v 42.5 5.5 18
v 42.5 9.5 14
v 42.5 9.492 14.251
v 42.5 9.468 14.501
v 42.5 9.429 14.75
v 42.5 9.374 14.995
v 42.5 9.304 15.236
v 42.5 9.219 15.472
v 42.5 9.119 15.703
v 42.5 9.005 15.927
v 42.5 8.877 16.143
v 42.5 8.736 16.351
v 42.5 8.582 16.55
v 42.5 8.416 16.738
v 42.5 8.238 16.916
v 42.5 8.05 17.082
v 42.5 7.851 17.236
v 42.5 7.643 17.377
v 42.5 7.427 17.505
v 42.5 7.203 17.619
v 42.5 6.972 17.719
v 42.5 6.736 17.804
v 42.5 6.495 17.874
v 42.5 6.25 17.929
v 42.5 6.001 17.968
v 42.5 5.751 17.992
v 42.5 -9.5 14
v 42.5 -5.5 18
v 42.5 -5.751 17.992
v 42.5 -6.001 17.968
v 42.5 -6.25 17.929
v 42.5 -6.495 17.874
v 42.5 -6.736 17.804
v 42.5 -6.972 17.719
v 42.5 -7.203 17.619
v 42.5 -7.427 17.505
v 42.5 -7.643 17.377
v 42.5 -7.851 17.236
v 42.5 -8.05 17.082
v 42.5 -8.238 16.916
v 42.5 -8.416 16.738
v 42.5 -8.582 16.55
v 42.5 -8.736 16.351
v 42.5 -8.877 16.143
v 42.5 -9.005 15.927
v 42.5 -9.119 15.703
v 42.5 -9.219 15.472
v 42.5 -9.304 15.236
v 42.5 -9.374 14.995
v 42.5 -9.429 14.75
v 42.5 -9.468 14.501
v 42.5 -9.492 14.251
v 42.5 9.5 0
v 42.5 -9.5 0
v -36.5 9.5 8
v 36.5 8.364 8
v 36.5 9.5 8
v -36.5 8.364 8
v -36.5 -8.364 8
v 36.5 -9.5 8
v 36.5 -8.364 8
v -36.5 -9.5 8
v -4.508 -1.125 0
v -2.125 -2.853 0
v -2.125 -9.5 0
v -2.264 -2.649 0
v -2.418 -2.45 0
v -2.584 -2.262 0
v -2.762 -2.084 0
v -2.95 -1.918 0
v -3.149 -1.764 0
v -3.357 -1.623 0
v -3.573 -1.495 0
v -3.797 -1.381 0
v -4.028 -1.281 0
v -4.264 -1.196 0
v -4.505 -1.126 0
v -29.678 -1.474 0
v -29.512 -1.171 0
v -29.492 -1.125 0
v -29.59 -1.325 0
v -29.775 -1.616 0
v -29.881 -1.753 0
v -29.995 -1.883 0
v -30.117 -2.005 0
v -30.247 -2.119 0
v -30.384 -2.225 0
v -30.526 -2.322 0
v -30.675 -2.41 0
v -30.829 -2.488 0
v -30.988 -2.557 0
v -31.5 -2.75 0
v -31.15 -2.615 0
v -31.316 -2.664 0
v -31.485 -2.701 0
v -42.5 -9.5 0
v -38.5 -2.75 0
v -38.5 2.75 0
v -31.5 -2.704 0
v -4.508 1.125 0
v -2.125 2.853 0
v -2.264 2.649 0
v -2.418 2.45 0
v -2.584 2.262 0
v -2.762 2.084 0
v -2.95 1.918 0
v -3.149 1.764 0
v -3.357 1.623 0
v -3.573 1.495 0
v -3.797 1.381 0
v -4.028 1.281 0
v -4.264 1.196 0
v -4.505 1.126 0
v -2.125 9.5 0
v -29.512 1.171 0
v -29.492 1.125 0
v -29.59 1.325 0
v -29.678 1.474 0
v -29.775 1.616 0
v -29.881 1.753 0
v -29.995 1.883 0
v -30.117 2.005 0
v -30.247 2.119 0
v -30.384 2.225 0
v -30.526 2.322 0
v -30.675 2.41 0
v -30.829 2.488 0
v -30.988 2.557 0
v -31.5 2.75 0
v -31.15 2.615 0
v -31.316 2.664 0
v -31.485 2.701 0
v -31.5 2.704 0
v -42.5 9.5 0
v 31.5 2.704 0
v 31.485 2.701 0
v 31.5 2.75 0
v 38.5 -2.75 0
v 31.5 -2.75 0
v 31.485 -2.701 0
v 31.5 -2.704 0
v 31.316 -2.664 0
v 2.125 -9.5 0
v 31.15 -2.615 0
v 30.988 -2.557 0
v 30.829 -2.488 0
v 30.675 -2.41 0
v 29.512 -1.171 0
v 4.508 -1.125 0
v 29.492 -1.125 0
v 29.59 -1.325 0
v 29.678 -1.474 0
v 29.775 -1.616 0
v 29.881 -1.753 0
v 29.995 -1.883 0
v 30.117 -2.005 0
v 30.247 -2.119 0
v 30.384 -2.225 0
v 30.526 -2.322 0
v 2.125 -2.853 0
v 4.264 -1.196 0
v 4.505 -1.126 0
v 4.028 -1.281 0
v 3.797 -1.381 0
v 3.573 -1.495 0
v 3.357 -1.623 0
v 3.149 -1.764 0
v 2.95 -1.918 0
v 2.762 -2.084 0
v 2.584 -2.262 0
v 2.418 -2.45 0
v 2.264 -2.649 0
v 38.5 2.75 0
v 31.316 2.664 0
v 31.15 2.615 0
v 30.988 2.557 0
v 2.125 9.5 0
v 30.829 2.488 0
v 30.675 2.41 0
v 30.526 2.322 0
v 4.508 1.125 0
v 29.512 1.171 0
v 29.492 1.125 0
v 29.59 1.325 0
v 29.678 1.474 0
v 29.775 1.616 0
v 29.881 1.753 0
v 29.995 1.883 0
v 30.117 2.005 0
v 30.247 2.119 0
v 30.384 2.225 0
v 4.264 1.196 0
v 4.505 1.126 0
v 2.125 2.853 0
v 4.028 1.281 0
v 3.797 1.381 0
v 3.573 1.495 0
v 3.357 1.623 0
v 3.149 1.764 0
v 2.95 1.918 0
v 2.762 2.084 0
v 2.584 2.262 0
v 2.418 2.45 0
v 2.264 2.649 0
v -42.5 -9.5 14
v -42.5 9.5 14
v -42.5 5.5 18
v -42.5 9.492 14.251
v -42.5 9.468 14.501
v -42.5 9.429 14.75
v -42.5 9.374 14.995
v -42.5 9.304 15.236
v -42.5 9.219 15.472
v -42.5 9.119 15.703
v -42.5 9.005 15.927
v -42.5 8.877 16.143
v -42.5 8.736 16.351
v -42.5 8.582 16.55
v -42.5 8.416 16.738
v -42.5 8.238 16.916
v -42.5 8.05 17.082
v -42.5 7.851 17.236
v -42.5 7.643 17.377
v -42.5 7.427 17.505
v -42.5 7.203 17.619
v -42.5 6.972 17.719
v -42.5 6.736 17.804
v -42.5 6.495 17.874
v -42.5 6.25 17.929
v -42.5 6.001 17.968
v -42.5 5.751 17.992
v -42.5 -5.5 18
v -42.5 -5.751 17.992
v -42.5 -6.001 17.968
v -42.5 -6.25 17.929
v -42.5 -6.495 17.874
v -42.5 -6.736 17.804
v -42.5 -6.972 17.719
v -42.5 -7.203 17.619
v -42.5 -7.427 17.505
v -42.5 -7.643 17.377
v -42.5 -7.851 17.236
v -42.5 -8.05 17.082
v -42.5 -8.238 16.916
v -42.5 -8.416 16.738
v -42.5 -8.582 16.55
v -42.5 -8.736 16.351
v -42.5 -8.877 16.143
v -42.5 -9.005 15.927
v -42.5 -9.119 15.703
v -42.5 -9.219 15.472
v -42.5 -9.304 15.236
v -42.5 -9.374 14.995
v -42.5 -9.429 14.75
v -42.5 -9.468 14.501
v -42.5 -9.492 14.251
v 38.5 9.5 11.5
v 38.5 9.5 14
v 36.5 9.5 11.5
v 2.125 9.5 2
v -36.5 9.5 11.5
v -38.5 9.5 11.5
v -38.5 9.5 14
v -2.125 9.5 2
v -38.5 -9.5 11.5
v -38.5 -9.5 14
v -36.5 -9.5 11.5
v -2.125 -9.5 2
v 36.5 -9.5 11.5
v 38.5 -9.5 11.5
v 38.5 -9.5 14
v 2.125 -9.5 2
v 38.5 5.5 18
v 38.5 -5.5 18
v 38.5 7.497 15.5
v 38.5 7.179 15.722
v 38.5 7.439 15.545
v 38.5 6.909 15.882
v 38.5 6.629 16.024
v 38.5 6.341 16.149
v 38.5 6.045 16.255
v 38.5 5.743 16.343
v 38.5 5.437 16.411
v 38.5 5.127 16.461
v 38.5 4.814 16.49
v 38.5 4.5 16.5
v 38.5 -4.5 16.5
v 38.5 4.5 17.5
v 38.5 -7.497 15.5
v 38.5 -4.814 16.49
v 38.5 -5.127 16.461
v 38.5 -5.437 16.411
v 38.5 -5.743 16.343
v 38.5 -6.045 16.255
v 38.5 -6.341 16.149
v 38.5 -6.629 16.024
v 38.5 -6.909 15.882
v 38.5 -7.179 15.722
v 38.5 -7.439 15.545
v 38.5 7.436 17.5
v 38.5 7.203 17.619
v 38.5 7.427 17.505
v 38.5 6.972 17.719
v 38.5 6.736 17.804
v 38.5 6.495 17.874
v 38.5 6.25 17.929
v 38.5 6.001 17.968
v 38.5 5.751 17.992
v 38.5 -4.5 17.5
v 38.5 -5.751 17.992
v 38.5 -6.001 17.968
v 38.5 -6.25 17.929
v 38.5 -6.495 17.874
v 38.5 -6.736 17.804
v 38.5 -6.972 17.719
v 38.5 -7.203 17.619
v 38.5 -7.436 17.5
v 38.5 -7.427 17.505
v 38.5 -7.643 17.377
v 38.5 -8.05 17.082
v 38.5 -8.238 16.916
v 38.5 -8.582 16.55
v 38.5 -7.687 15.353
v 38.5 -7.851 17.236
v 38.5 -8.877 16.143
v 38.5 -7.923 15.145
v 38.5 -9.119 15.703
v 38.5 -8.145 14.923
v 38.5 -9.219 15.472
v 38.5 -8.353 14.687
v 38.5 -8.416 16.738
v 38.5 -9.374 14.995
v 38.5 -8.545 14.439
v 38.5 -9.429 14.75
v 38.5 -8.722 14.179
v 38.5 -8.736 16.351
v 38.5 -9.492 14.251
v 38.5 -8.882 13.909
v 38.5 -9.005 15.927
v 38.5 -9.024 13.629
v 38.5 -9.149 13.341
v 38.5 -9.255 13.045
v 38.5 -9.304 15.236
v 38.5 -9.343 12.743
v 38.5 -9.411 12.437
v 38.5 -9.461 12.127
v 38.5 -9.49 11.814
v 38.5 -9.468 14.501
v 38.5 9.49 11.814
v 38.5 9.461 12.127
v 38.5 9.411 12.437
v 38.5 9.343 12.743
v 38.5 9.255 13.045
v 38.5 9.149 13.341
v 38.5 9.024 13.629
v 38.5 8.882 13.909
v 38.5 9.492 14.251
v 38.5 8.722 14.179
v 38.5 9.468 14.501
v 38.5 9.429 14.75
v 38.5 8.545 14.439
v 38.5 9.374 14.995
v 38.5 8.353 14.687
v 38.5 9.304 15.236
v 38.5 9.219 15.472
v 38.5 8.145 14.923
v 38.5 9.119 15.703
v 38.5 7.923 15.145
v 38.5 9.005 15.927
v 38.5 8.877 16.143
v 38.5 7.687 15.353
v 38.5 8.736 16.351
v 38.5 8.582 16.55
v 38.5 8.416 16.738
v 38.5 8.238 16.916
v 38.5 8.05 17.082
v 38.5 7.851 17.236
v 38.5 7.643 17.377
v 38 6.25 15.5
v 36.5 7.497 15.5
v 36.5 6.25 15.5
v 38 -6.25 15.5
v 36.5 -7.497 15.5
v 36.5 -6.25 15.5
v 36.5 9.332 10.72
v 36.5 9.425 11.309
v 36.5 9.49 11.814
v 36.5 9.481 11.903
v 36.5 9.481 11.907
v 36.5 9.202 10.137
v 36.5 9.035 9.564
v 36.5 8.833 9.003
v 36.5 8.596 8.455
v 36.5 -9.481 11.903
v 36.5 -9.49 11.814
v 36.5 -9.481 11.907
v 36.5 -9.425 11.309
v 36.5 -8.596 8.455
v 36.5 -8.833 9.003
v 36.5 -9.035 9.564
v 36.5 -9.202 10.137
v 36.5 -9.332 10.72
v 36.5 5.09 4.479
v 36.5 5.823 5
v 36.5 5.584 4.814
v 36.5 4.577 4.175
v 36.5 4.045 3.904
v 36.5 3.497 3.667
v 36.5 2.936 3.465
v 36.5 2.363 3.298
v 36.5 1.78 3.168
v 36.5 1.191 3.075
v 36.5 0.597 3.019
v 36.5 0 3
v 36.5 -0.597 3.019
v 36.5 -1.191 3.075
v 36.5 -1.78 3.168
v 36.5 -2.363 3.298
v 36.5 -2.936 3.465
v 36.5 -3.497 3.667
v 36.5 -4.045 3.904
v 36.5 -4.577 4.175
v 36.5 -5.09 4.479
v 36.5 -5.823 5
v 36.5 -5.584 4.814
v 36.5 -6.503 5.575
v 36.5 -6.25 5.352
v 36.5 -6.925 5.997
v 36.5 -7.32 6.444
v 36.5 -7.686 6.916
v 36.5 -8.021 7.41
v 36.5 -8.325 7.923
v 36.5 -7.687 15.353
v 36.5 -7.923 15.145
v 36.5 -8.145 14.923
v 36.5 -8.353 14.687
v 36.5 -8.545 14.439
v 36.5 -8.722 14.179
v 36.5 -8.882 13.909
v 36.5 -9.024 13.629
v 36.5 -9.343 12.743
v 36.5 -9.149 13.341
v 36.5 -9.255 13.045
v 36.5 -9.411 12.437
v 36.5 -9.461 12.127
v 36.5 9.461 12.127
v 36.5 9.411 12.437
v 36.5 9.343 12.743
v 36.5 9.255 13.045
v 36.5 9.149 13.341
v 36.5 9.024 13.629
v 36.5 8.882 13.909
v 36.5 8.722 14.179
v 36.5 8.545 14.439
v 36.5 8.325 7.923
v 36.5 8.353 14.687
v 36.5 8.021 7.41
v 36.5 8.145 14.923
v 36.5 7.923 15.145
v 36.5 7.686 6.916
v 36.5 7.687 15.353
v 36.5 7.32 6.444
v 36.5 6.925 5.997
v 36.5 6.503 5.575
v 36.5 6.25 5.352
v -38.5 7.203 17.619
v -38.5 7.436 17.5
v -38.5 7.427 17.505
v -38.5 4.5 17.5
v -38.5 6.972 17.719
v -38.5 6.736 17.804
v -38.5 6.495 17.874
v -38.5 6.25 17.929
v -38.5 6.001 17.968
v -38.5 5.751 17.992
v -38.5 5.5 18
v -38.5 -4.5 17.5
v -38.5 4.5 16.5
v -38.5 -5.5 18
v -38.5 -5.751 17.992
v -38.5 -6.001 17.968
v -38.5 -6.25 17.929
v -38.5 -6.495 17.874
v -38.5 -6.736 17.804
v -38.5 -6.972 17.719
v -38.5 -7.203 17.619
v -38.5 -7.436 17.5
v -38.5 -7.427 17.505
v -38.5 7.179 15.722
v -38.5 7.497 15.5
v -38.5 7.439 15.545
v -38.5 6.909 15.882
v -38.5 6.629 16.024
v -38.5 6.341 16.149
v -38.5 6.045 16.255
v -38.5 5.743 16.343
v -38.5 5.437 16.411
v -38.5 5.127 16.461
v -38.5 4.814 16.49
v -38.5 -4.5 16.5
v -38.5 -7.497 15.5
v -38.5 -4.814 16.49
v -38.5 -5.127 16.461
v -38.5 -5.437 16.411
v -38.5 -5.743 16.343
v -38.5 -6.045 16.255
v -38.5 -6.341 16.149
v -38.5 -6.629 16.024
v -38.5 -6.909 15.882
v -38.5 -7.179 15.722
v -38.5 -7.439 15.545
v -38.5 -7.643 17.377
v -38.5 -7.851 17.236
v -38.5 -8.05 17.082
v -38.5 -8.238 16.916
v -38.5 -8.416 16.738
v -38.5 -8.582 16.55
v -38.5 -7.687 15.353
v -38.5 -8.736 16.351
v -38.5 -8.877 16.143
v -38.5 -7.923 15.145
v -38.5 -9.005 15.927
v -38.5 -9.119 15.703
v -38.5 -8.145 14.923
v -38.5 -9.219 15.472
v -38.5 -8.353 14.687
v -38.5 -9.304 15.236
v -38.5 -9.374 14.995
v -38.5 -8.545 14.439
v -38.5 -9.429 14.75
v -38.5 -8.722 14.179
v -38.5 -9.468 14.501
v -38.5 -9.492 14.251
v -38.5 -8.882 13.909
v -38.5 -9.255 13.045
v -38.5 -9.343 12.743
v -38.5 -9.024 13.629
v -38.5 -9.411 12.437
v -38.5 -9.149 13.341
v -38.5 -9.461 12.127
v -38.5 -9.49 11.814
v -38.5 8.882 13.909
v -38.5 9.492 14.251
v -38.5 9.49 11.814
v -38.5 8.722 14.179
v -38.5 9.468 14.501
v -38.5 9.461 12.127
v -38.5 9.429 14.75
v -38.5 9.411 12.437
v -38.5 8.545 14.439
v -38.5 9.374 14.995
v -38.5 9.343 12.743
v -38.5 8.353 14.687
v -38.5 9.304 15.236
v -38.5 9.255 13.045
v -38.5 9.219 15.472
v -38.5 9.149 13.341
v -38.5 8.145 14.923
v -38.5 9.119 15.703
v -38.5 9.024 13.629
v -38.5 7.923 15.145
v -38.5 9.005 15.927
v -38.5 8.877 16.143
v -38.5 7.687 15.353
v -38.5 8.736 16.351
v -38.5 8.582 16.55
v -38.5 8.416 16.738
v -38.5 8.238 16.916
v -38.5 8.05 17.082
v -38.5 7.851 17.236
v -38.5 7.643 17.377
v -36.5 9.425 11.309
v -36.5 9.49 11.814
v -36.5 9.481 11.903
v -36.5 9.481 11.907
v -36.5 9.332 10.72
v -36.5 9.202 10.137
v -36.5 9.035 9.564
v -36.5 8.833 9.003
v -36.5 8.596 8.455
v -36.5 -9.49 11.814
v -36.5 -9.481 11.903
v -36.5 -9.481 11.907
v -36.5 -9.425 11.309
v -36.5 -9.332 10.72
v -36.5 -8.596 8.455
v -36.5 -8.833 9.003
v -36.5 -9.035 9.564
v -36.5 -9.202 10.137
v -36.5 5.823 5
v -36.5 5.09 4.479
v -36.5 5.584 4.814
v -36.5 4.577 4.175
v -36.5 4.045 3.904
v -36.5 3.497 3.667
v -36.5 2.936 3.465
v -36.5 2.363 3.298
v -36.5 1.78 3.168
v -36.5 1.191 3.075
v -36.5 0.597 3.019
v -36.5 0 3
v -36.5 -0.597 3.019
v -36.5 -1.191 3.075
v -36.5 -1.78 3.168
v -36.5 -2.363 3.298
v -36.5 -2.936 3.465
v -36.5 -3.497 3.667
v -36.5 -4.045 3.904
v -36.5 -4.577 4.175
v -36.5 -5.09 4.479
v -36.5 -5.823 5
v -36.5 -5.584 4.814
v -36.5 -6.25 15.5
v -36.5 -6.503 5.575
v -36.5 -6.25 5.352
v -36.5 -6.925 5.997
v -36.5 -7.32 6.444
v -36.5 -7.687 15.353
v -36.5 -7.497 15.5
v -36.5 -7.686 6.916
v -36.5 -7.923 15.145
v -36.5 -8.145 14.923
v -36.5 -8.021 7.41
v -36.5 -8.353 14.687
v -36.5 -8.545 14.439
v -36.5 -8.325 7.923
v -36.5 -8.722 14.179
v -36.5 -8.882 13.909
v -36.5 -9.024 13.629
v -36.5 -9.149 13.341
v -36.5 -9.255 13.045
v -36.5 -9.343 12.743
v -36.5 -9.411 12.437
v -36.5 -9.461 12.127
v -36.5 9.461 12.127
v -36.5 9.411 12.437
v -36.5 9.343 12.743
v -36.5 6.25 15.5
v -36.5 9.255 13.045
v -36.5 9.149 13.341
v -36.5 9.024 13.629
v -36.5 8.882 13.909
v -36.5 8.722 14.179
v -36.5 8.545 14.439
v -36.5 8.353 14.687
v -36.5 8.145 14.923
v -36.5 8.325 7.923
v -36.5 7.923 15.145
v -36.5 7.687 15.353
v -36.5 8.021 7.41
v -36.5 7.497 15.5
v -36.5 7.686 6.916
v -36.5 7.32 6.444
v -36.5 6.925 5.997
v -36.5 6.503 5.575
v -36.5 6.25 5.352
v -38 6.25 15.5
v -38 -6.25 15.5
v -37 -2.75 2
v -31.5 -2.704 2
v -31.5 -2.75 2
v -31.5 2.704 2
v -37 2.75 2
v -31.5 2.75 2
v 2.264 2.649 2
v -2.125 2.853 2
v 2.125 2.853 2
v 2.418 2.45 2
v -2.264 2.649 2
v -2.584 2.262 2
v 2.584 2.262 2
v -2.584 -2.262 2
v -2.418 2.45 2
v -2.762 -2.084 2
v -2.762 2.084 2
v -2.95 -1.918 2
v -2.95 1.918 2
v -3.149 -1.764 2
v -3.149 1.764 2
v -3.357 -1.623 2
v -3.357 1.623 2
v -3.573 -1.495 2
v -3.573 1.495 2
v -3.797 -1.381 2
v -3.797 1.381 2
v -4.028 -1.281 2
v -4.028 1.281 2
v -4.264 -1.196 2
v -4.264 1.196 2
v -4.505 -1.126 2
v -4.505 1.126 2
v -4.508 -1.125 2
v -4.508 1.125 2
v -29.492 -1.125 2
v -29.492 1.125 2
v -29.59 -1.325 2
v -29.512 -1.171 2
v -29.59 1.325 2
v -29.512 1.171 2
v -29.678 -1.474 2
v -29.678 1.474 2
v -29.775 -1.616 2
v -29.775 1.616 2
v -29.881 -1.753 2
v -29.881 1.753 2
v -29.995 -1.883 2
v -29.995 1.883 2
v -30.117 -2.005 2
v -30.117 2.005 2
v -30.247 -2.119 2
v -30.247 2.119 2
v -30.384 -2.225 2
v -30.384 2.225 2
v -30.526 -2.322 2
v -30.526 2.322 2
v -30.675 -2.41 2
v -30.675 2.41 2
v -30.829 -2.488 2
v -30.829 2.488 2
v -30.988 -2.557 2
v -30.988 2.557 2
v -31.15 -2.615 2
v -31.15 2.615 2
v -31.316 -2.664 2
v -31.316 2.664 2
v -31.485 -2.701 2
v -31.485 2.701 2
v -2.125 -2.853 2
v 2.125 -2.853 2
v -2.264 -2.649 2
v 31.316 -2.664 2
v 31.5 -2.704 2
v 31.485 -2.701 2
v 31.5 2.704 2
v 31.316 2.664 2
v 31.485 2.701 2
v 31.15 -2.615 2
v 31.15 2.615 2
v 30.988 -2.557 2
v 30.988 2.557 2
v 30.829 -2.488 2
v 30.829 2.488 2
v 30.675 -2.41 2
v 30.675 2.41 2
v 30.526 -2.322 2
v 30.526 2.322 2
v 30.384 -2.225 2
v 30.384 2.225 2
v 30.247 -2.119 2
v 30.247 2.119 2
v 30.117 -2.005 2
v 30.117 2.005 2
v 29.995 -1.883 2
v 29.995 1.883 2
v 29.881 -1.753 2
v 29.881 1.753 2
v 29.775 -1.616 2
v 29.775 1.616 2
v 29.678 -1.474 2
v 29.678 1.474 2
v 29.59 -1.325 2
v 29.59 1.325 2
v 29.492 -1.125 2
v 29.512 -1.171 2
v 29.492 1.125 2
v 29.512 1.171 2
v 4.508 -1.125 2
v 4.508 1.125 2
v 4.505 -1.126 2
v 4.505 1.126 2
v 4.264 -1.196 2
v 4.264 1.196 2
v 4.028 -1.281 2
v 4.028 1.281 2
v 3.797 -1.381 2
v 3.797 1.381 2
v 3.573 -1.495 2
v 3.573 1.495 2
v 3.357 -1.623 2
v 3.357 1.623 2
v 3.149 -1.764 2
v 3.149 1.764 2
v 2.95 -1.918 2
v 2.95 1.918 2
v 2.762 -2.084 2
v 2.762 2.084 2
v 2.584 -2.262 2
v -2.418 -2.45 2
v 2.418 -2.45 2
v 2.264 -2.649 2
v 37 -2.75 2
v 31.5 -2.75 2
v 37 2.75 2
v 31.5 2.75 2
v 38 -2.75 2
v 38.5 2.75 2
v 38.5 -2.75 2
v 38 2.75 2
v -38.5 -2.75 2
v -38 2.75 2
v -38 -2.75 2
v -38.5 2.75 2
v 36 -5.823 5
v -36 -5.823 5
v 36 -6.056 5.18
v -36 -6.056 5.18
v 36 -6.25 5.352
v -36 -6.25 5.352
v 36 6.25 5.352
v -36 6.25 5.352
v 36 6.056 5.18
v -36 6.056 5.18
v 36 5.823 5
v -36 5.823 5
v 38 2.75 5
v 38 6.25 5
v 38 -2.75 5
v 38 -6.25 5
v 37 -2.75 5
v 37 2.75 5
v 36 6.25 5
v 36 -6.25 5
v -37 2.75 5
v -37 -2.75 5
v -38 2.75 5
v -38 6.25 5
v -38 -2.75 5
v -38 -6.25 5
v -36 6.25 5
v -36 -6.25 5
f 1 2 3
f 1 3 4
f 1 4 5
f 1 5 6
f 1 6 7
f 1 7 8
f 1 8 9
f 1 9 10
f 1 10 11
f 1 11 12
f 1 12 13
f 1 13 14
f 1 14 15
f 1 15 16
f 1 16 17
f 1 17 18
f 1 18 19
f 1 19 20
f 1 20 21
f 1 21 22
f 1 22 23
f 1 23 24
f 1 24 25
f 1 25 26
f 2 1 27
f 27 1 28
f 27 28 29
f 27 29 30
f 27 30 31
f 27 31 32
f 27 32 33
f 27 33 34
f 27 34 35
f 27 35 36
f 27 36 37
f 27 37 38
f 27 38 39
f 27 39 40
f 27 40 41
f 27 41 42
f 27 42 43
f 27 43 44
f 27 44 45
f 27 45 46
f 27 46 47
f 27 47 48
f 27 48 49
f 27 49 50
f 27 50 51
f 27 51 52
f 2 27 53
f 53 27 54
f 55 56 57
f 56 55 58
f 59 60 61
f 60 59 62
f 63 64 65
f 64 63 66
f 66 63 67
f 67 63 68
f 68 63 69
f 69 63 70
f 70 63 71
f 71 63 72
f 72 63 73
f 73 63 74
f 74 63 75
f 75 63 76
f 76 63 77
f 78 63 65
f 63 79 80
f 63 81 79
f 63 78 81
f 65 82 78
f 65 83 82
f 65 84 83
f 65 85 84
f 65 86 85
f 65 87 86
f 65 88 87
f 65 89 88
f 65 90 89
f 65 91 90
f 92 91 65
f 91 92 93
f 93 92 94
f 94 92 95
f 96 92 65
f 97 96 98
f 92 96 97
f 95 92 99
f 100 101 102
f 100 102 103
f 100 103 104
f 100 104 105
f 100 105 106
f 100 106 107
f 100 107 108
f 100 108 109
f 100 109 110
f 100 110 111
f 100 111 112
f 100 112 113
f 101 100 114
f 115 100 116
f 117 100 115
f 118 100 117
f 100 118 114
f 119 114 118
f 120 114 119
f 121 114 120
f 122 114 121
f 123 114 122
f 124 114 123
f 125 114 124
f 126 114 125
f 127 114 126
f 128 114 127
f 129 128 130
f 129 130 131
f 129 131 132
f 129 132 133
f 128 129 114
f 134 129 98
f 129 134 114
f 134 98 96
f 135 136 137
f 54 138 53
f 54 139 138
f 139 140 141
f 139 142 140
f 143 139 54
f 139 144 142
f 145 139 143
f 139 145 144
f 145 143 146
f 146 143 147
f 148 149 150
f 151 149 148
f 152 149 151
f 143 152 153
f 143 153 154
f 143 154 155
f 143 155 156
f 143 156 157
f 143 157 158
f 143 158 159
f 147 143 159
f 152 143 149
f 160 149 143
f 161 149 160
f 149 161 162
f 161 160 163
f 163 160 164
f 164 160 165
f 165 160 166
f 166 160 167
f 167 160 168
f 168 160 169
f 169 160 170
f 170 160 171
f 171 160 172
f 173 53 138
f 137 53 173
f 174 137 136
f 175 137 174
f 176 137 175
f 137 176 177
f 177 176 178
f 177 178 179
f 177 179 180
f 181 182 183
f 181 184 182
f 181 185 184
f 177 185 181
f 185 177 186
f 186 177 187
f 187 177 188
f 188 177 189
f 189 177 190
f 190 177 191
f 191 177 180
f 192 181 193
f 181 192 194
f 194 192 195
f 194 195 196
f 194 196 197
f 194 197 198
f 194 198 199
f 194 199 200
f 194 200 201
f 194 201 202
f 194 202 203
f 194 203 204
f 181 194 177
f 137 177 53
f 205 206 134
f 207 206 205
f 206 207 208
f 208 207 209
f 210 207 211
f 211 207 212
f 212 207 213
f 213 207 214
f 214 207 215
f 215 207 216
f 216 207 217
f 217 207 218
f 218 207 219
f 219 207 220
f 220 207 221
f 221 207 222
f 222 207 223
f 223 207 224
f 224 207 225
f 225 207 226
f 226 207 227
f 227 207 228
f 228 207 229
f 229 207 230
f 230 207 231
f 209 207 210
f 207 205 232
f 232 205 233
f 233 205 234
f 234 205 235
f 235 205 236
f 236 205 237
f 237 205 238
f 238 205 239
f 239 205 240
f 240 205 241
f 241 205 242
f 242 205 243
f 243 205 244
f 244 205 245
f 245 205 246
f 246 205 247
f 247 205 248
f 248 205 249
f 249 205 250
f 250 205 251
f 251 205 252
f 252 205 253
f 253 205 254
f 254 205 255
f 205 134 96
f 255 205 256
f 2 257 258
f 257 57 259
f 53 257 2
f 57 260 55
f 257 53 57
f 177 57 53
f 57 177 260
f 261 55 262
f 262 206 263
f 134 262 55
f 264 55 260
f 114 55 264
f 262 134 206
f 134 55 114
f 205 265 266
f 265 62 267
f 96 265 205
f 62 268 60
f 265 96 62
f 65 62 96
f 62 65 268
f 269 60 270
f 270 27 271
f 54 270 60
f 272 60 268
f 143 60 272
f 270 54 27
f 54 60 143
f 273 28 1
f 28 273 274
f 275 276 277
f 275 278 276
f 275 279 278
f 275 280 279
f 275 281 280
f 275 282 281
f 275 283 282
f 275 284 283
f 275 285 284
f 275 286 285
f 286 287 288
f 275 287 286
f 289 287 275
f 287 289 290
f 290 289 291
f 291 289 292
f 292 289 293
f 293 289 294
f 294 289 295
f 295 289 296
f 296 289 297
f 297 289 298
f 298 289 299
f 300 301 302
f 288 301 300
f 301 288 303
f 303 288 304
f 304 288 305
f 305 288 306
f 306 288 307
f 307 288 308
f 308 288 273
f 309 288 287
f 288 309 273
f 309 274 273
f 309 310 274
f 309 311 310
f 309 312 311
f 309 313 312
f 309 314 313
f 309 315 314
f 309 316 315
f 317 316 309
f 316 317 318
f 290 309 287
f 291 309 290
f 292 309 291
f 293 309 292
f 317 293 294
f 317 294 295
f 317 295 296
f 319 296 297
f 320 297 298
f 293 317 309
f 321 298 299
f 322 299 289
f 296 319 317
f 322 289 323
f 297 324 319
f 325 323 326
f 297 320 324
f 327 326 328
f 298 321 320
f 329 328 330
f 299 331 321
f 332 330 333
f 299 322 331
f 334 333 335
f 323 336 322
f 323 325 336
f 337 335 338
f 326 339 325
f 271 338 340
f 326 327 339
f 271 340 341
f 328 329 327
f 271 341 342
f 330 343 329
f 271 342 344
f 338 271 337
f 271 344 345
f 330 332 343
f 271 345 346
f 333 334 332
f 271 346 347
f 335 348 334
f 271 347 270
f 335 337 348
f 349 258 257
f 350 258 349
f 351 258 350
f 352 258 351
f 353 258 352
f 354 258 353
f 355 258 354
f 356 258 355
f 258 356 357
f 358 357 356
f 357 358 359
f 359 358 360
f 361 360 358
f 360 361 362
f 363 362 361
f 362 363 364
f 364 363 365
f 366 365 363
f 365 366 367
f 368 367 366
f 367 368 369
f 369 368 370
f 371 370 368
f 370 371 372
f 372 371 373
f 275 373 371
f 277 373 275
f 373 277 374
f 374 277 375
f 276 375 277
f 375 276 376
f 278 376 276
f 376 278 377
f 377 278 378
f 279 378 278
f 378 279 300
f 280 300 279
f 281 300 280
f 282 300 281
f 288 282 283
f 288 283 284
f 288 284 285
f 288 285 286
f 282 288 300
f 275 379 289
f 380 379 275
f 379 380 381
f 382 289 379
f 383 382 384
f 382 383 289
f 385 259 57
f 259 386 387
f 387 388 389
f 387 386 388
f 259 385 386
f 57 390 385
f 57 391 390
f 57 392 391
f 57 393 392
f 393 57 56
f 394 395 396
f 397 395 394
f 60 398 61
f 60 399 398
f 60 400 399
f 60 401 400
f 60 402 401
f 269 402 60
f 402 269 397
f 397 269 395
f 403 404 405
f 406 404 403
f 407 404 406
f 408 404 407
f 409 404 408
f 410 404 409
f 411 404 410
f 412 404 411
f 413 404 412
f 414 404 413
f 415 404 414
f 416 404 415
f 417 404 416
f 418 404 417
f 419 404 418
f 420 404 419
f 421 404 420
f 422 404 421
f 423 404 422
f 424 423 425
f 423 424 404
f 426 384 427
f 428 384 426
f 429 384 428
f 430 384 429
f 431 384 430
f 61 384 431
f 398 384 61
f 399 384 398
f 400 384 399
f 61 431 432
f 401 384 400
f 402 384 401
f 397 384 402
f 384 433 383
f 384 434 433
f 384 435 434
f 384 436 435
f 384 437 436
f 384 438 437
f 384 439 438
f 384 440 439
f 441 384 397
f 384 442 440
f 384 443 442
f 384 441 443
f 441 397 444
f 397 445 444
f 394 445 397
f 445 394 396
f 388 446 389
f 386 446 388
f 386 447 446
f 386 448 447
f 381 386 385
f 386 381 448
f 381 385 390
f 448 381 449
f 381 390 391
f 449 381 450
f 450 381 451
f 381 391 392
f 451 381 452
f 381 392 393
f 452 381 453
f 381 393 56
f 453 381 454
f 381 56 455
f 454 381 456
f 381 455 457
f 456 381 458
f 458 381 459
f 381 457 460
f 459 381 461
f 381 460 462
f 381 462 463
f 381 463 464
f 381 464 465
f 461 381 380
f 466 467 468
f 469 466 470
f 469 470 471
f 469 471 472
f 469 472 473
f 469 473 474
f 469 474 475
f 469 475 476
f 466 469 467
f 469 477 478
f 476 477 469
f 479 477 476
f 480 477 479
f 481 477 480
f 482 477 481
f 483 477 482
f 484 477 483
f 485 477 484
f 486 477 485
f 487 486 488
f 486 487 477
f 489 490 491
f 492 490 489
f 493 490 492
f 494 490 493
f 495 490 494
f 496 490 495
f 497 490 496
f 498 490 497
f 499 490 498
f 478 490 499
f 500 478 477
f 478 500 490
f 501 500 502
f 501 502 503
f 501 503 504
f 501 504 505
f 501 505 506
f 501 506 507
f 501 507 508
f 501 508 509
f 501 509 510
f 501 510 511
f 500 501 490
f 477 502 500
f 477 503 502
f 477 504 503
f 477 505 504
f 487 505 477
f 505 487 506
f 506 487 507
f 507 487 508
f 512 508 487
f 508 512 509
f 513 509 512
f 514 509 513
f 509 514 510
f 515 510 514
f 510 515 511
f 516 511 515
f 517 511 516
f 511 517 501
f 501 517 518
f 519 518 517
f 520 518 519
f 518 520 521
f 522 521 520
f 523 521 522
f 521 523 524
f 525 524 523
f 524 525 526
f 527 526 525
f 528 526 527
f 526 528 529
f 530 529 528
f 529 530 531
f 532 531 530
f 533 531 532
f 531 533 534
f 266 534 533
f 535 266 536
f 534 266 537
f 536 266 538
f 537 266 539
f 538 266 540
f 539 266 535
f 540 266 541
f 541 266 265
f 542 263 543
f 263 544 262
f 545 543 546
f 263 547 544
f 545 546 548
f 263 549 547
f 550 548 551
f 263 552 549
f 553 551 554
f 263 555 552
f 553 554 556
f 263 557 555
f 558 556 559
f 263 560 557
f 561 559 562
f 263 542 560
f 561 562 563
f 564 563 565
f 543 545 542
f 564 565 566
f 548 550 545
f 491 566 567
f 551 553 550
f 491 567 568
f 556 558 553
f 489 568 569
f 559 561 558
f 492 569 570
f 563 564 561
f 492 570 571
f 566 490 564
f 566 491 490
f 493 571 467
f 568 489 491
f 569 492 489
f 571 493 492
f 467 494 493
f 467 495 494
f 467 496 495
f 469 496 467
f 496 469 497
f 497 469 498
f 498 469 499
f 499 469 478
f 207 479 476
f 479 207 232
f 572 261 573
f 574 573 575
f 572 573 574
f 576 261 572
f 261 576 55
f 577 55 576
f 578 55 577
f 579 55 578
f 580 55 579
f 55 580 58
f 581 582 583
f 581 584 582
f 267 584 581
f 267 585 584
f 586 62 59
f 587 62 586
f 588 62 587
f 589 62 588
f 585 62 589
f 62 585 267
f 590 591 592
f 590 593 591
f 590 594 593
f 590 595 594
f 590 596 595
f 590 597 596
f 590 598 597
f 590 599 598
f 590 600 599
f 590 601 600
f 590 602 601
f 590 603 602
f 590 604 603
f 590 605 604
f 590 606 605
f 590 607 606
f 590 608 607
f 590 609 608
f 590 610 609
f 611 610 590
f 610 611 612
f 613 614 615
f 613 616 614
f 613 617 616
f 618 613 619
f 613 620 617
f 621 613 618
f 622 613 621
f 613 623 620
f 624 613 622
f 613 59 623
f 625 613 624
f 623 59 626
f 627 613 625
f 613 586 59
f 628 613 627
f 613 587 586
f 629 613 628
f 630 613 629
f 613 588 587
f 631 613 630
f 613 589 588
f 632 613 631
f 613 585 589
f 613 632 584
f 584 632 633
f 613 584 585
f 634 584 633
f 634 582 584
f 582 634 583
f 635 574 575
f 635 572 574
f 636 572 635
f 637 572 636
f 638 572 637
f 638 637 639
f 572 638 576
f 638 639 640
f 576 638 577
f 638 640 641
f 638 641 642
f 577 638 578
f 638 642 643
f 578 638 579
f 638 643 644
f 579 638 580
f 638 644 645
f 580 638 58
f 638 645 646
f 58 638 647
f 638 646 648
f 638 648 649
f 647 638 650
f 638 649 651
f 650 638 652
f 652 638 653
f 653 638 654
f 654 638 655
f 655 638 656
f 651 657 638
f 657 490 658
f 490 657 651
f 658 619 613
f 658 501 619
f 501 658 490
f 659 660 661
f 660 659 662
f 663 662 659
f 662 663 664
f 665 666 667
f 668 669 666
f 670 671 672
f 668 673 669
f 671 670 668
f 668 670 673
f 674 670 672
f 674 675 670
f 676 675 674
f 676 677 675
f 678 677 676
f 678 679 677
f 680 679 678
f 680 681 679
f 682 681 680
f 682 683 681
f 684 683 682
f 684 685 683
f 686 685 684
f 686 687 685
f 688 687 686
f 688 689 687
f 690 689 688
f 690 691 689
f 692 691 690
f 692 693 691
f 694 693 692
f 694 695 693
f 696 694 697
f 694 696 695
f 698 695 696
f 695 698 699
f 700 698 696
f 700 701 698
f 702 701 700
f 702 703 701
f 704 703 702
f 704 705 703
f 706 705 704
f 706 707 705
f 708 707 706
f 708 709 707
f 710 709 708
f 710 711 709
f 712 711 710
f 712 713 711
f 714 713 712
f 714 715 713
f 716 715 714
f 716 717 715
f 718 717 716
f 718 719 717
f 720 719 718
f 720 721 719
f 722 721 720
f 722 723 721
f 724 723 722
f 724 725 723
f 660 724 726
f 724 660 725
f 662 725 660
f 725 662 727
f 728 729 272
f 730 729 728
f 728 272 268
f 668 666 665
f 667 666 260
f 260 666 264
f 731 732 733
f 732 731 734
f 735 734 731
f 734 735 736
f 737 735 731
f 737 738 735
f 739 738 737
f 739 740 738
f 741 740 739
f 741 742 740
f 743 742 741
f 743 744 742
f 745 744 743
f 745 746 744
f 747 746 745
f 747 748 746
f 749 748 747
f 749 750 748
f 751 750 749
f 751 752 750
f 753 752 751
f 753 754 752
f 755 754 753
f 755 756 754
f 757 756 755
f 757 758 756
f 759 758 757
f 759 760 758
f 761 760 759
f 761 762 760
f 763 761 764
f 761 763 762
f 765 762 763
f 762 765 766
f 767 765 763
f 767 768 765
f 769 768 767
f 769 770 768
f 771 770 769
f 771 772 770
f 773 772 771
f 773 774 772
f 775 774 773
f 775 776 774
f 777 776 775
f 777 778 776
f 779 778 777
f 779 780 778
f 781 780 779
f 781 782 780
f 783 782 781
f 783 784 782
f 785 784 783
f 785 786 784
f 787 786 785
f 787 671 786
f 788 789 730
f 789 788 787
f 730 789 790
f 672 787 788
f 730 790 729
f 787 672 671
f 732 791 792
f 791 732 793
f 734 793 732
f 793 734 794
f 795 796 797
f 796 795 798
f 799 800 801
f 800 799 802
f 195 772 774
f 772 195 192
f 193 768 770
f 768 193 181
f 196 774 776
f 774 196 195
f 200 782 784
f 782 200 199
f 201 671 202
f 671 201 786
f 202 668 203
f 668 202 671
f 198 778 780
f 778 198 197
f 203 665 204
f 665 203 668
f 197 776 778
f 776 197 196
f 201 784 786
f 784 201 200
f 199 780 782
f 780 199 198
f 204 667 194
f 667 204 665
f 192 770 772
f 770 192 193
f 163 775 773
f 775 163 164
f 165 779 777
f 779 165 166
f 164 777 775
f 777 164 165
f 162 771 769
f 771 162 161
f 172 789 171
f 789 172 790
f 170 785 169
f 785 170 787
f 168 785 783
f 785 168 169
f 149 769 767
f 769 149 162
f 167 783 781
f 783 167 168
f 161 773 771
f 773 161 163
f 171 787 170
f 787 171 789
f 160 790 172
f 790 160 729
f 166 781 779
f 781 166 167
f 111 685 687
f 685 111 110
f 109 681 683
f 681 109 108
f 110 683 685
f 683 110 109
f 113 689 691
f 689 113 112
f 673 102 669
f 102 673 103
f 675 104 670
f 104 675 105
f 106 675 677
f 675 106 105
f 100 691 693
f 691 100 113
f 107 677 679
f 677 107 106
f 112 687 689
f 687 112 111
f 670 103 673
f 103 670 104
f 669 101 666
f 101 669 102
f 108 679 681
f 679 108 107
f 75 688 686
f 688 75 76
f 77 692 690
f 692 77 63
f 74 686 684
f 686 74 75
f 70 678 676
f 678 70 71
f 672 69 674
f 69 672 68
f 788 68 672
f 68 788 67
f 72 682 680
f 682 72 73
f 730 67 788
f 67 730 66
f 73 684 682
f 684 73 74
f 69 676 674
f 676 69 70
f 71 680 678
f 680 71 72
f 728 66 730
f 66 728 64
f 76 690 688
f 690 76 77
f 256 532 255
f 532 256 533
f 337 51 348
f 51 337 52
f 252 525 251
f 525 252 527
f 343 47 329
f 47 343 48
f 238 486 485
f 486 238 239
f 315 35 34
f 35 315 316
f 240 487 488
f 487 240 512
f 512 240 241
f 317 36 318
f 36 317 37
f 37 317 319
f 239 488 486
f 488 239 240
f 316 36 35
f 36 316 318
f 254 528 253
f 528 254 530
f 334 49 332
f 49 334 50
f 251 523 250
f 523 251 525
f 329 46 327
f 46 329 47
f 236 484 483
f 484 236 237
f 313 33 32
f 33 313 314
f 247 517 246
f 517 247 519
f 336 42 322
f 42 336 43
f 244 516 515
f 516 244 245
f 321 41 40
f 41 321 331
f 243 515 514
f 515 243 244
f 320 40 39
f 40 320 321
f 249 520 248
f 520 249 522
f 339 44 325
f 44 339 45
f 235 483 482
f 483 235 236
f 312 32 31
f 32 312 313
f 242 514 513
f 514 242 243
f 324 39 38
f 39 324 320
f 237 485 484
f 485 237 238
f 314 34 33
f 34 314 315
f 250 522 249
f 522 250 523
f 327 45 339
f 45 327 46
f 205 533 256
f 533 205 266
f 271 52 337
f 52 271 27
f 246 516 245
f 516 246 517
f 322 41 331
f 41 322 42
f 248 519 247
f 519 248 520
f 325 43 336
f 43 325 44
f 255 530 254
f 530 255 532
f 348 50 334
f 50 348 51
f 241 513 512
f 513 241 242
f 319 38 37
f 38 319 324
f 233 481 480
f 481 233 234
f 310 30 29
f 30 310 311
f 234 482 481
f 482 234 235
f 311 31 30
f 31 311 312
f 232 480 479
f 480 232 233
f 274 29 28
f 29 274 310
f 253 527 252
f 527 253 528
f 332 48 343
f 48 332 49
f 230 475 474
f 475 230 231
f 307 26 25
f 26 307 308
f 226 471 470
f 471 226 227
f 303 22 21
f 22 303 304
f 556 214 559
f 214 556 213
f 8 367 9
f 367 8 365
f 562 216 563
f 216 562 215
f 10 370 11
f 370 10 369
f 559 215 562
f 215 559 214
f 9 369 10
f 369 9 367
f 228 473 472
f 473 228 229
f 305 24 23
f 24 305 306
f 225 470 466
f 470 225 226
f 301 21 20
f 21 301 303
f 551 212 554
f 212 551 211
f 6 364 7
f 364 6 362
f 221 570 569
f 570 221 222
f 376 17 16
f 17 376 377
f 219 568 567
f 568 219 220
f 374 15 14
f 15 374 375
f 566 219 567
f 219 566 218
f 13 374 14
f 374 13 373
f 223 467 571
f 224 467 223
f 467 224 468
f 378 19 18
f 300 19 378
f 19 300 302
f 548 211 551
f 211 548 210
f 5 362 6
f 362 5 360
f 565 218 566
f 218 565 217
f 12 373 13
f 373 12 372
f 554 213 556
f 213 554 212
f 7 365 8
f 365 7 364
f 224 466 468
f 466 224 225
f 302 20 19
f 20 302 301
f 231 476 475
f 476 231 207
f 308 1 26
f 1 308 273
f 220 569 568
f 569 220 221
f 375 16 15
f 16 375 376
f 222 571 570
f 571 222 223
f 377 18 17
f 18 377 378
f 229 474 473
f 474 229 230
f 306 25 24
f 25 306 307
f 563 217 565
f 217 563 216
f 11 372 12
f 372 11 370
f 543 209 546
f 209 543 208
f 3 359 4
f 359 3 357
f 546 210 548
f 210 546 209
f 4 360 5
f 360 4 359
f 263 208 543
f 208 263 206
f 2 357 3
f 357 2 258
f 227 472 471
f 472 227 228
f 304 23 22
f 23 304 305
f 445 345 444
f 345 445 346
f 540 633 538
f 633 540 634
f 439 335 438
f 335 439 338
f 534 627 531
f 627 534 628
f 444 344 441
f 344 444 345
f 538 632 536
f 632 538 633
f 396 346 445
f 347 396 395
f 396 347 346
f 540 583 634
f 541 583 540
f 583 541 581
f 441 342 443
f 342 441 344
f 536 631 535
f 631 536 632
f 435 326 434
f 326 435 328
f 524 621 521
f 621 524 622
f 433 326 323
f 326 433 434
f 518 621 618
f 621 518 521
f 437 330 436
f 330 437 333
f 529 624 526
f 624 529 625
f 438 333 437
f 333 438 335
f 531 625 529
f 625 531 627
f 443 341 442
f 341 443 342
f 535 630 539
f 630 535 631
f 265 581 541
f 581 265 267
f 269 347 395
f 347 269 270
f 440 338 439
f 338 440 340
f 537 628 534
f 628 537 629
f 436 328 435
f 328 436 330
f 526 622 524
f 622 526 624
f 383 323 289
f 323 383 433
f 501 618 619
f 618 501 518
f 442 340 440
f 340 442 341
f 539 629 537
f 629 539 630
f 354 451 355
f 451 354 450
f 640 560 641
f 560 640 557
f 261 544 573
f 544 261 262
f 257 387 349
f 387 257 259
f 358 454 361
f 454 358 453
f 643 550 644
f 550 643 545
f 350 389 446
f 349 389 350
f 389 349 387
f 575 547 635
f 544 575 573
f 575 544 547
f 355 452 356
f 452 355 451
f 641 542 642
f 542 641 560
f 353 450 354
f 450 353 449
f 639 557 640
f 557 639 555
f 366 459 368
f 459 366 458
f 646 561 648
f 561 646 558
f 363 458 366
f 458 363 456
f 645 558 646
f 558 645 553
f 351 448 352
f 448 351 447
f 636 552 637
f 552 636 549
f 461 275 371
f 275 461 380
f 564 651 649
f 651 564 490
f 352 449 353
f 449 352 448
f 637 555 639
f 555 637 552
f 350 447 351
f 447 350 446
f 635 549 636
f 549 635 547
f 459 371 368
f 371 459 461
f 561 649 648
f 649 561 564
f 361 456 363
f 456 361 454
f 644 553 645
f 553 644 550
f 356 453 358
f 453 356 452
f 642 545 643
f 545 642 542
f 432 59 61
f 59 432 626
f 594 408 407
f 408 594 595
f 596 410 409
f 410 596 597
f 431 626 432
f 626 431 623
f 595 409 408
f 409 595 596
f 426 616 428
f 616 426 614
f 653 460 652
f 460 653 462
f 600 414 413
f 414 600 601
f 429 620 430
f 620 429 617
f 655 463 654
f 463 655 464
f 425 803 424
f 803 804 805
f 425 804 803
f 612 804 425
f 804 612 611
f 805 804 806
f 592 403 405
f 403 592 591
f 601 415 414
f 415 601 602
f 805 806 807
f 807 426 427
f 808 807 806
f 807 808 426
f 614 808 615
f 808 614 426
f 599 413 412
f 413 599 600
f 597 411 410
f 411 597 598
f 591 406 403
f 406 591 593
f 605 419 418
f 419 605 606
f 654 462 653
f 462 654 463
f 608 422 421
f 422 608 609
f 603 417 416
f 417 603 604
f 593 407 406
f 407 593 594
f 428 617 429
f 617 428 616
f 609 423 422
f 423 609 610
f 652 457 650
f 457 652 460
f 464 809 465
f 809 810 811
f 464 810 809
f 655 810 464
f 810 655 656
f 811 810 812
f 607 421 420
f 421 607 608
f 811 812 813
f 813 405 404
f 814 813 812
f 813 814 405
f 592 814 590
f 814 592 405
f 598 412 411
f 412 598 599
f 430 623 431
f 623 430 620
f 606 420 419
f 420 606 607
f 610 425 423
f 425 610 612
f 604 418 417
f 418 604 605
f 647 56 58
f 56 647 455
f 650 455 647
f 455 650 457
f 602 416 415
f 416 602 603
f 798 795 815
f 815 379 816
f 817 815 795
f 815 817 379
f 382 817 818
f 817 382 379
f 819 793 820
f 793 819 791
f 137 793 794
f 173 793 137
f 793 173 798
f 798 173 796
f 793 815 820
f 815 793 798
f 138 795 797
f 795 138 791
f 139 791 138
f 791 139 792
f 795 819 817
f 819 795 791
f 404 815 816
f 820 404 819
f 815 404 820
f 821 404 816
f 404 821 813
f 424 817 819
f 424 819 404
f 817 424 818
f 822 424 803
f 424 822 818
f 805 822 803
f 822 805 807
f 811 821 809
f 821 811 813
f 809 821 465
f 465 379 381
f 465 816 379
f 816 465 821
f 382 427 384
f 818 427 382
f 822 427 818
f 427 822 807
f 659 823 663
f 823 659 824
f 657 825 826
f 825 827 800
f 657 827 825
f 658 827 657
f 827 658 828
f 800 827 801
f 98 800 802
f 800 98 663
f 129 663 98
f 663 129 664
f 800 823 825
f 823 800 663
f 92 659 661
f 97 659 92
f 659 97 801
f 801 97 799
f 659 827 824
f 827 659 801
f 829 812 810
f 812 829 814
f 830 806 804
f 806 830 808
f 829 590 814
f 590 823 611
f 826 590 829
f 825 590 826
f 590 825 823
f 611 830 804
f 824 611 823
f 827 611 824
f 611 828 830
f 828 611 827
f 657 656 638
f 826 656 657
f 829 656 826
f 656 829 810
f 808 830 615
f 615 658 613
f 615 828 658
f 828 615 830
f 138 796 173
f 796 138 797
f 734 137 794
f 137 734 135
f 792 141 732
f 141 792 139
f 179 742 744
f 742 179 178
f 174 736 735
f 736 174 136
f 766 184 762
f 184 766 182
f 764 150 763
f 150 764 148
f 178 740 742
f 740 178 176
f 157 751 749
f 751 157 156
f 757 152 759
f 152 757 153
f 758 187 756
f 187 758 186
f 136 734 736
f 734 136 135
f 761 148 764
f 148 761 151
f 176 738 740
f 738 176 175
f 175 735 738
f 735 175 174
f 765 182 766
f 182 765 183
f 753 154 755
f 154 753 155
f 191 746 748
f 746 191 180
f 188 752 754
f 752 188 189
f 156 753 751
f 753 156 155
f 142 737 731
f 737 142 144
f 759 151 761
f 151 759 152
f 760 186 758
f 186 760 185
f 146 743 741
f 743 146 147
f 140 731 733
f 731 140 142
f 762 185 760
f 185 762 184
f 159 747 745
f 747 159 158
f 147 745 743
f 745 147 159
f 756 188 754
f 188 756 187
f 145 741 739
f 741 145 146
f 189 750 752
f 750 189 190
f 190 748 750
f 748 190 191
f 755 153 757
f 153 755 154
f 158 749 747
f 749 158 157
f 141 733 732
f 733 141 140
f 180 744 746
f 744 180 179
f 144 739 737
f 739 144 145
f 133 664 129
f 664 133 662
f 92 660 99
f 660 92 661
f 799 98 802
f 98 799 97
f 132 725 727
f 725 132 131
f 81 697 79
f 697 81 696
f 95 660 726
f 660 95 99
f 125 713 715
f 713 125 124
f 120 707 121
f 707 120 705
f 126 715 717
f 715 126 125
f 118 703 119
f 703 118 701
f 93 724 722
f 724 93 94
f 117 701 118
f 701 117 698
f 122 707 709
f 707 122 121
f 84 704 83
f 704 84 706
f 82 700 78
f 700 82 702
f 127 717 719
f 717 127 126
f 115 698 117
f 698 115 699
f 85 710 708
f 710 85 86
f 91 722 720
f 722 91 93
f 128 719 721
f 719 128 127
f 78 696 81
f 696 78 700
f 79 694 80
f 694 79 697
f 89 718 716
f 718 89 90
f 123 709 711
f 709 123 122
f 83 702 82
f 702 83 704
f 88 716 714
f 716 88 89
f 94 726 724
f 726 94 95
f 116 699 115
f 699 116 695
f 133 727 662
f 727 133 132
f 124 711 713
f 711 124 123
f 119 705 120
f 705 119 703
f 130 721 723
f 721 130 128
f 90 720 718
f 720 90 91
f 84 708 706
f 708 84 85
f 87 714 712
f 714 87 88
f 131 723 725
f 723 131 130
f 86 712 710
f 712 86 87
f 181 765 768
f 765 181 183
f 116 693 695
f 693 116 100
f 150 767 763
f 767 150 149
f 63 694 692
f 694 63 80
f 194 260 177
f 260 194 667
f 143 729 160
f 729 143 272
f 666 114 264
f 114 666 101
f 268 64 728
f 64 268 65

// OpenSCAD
$fn = 100; // upgrade resolution
battery_diameter = 19;
battery_length = 73; // 69 for unprotected

difference()
{
    union()
    {
        // battery holder
        translate([0, 0, 4]) cube(size=[battery_length+8+4, battery_diameter, 8], center=true);

        // positive outside edge
        translate([(battery_length/2)+4, 0, 9]) cube(size=[4, battery_diameter, 18], center=true);

        // positive terminal holder
        translate([(battery_length/2)+1, 0, 8.75]) cube(size=[2, battery_diameter, 13.5], center=true);

        // negative outside edge
        translate([-((battery_length/2)+4), 0, 9]) cube(size=[4, battery_diameter, 18], center=true);

        // negative terminal holder
        translate([-((battery_length/2)+1), 0, 8.75]) cube(size=[2, battery_diameter, 13.5], center=true);
    }

    // battery cradle
    translate([0, 0, (battery_diameter/2)+3]) rotate(90, [0, 1, 0]) cylinder(r=battery_diameter/2, h=battery_length, center=true);

    // positive plate cutout
    translate([(battery_length+2)/2, 0, battery_diameter/2]) cube(size=[1, 5.5, 20], center=true);
    translate([(battery_length+2)/2-0.5, 0, 11]) cube(size=[2, 12.5, 12], center=true);

    // negative spring cutout
    translate([-((battery_length+2)/2), 0, battery_diameter/2]) cube(size=[1, 5.5, 20], center=true);
    translate([-((battery_length+2)/2-0.5), 0, 11]) cube(size=[2, 12.5, 12], center=true);

    // positive solder flange cutout
    translate([(battery_length/2-1.5), 0, -0.5]) cube(size=[7, 5.5, 5], center=true);
    translate([(battery_length/2)-4.5, 0, -0.5]) cylinder(r=2.75, h=5, center=true);

    // negative solder flange cutout
    translate([-(battery_length/2-1.5), 0, -0.5]) cube(size=[7, 5.5, 5], center=true);
    translate([-(battery_length/2)+4.5, 0, -0.5]) cylinder(r=2.75, h=5, center=true);

    // positive bottom cutout for wires
    translate([30/2, 0, -0.75]) cube(size=[30, 2.25, 5.5], center=true);
    translate([3/2, 1, -0.75]) edge(4, 5.5);
    translate([3/2, -1, -0.75]) rotate(-90, [0, 0, 1]) edge(4, 5.5);

    // negative bottom cutout for wires
    translate([-30/2, 0, -0.75]) cube(size=[30, 2.25, 5.5], center=true);
    translate([-3/2, 1, -0.75]) rotate(90, [0, 0, 1]) edge(4, 5.5);
    translate([-3/2, -1, -0.75]) rotate(180, [0, 0, 1]) edge(4, 5.5);

    // joining bottom cutout for wires
    translate([0, 0, -0.75]) cube(size=[4.25, battery_diameter+5, 5.5], center=true);

    // rounded corners on end plates
    translate([0, -battery_diameter/2, 18]) rotate(90, [0, 1, 0]) edge(4, battery_length+13);
    translate([0, battery_diameter/2, 18]) rotate(90, [0, 1, 0]) rotate(-90, [0, 0, 1]) edge(4, battery_length+13);
    translate([0, -battery_diameter/2, 16.5]) rotate(90, [0, 1, 0]) edge(5, battery_length+4);
    translate([0, battery_diameter/2, 16.5]) rotate(90, [0, 1, 0]) rotate(-90, [0, 0, 1]) edge(5, battery_length+4);
}

module edge(radius, height)
{
	difference()
	{
		translate([radius/2-0.5, radius/2-0.5, 0]) cube([radius+1, radius+1, height], center = true);
		translate([radius, radius, 0]) cylinder(h = height+1, r1 = radius, r2 = radius, center = true);
	}
}
